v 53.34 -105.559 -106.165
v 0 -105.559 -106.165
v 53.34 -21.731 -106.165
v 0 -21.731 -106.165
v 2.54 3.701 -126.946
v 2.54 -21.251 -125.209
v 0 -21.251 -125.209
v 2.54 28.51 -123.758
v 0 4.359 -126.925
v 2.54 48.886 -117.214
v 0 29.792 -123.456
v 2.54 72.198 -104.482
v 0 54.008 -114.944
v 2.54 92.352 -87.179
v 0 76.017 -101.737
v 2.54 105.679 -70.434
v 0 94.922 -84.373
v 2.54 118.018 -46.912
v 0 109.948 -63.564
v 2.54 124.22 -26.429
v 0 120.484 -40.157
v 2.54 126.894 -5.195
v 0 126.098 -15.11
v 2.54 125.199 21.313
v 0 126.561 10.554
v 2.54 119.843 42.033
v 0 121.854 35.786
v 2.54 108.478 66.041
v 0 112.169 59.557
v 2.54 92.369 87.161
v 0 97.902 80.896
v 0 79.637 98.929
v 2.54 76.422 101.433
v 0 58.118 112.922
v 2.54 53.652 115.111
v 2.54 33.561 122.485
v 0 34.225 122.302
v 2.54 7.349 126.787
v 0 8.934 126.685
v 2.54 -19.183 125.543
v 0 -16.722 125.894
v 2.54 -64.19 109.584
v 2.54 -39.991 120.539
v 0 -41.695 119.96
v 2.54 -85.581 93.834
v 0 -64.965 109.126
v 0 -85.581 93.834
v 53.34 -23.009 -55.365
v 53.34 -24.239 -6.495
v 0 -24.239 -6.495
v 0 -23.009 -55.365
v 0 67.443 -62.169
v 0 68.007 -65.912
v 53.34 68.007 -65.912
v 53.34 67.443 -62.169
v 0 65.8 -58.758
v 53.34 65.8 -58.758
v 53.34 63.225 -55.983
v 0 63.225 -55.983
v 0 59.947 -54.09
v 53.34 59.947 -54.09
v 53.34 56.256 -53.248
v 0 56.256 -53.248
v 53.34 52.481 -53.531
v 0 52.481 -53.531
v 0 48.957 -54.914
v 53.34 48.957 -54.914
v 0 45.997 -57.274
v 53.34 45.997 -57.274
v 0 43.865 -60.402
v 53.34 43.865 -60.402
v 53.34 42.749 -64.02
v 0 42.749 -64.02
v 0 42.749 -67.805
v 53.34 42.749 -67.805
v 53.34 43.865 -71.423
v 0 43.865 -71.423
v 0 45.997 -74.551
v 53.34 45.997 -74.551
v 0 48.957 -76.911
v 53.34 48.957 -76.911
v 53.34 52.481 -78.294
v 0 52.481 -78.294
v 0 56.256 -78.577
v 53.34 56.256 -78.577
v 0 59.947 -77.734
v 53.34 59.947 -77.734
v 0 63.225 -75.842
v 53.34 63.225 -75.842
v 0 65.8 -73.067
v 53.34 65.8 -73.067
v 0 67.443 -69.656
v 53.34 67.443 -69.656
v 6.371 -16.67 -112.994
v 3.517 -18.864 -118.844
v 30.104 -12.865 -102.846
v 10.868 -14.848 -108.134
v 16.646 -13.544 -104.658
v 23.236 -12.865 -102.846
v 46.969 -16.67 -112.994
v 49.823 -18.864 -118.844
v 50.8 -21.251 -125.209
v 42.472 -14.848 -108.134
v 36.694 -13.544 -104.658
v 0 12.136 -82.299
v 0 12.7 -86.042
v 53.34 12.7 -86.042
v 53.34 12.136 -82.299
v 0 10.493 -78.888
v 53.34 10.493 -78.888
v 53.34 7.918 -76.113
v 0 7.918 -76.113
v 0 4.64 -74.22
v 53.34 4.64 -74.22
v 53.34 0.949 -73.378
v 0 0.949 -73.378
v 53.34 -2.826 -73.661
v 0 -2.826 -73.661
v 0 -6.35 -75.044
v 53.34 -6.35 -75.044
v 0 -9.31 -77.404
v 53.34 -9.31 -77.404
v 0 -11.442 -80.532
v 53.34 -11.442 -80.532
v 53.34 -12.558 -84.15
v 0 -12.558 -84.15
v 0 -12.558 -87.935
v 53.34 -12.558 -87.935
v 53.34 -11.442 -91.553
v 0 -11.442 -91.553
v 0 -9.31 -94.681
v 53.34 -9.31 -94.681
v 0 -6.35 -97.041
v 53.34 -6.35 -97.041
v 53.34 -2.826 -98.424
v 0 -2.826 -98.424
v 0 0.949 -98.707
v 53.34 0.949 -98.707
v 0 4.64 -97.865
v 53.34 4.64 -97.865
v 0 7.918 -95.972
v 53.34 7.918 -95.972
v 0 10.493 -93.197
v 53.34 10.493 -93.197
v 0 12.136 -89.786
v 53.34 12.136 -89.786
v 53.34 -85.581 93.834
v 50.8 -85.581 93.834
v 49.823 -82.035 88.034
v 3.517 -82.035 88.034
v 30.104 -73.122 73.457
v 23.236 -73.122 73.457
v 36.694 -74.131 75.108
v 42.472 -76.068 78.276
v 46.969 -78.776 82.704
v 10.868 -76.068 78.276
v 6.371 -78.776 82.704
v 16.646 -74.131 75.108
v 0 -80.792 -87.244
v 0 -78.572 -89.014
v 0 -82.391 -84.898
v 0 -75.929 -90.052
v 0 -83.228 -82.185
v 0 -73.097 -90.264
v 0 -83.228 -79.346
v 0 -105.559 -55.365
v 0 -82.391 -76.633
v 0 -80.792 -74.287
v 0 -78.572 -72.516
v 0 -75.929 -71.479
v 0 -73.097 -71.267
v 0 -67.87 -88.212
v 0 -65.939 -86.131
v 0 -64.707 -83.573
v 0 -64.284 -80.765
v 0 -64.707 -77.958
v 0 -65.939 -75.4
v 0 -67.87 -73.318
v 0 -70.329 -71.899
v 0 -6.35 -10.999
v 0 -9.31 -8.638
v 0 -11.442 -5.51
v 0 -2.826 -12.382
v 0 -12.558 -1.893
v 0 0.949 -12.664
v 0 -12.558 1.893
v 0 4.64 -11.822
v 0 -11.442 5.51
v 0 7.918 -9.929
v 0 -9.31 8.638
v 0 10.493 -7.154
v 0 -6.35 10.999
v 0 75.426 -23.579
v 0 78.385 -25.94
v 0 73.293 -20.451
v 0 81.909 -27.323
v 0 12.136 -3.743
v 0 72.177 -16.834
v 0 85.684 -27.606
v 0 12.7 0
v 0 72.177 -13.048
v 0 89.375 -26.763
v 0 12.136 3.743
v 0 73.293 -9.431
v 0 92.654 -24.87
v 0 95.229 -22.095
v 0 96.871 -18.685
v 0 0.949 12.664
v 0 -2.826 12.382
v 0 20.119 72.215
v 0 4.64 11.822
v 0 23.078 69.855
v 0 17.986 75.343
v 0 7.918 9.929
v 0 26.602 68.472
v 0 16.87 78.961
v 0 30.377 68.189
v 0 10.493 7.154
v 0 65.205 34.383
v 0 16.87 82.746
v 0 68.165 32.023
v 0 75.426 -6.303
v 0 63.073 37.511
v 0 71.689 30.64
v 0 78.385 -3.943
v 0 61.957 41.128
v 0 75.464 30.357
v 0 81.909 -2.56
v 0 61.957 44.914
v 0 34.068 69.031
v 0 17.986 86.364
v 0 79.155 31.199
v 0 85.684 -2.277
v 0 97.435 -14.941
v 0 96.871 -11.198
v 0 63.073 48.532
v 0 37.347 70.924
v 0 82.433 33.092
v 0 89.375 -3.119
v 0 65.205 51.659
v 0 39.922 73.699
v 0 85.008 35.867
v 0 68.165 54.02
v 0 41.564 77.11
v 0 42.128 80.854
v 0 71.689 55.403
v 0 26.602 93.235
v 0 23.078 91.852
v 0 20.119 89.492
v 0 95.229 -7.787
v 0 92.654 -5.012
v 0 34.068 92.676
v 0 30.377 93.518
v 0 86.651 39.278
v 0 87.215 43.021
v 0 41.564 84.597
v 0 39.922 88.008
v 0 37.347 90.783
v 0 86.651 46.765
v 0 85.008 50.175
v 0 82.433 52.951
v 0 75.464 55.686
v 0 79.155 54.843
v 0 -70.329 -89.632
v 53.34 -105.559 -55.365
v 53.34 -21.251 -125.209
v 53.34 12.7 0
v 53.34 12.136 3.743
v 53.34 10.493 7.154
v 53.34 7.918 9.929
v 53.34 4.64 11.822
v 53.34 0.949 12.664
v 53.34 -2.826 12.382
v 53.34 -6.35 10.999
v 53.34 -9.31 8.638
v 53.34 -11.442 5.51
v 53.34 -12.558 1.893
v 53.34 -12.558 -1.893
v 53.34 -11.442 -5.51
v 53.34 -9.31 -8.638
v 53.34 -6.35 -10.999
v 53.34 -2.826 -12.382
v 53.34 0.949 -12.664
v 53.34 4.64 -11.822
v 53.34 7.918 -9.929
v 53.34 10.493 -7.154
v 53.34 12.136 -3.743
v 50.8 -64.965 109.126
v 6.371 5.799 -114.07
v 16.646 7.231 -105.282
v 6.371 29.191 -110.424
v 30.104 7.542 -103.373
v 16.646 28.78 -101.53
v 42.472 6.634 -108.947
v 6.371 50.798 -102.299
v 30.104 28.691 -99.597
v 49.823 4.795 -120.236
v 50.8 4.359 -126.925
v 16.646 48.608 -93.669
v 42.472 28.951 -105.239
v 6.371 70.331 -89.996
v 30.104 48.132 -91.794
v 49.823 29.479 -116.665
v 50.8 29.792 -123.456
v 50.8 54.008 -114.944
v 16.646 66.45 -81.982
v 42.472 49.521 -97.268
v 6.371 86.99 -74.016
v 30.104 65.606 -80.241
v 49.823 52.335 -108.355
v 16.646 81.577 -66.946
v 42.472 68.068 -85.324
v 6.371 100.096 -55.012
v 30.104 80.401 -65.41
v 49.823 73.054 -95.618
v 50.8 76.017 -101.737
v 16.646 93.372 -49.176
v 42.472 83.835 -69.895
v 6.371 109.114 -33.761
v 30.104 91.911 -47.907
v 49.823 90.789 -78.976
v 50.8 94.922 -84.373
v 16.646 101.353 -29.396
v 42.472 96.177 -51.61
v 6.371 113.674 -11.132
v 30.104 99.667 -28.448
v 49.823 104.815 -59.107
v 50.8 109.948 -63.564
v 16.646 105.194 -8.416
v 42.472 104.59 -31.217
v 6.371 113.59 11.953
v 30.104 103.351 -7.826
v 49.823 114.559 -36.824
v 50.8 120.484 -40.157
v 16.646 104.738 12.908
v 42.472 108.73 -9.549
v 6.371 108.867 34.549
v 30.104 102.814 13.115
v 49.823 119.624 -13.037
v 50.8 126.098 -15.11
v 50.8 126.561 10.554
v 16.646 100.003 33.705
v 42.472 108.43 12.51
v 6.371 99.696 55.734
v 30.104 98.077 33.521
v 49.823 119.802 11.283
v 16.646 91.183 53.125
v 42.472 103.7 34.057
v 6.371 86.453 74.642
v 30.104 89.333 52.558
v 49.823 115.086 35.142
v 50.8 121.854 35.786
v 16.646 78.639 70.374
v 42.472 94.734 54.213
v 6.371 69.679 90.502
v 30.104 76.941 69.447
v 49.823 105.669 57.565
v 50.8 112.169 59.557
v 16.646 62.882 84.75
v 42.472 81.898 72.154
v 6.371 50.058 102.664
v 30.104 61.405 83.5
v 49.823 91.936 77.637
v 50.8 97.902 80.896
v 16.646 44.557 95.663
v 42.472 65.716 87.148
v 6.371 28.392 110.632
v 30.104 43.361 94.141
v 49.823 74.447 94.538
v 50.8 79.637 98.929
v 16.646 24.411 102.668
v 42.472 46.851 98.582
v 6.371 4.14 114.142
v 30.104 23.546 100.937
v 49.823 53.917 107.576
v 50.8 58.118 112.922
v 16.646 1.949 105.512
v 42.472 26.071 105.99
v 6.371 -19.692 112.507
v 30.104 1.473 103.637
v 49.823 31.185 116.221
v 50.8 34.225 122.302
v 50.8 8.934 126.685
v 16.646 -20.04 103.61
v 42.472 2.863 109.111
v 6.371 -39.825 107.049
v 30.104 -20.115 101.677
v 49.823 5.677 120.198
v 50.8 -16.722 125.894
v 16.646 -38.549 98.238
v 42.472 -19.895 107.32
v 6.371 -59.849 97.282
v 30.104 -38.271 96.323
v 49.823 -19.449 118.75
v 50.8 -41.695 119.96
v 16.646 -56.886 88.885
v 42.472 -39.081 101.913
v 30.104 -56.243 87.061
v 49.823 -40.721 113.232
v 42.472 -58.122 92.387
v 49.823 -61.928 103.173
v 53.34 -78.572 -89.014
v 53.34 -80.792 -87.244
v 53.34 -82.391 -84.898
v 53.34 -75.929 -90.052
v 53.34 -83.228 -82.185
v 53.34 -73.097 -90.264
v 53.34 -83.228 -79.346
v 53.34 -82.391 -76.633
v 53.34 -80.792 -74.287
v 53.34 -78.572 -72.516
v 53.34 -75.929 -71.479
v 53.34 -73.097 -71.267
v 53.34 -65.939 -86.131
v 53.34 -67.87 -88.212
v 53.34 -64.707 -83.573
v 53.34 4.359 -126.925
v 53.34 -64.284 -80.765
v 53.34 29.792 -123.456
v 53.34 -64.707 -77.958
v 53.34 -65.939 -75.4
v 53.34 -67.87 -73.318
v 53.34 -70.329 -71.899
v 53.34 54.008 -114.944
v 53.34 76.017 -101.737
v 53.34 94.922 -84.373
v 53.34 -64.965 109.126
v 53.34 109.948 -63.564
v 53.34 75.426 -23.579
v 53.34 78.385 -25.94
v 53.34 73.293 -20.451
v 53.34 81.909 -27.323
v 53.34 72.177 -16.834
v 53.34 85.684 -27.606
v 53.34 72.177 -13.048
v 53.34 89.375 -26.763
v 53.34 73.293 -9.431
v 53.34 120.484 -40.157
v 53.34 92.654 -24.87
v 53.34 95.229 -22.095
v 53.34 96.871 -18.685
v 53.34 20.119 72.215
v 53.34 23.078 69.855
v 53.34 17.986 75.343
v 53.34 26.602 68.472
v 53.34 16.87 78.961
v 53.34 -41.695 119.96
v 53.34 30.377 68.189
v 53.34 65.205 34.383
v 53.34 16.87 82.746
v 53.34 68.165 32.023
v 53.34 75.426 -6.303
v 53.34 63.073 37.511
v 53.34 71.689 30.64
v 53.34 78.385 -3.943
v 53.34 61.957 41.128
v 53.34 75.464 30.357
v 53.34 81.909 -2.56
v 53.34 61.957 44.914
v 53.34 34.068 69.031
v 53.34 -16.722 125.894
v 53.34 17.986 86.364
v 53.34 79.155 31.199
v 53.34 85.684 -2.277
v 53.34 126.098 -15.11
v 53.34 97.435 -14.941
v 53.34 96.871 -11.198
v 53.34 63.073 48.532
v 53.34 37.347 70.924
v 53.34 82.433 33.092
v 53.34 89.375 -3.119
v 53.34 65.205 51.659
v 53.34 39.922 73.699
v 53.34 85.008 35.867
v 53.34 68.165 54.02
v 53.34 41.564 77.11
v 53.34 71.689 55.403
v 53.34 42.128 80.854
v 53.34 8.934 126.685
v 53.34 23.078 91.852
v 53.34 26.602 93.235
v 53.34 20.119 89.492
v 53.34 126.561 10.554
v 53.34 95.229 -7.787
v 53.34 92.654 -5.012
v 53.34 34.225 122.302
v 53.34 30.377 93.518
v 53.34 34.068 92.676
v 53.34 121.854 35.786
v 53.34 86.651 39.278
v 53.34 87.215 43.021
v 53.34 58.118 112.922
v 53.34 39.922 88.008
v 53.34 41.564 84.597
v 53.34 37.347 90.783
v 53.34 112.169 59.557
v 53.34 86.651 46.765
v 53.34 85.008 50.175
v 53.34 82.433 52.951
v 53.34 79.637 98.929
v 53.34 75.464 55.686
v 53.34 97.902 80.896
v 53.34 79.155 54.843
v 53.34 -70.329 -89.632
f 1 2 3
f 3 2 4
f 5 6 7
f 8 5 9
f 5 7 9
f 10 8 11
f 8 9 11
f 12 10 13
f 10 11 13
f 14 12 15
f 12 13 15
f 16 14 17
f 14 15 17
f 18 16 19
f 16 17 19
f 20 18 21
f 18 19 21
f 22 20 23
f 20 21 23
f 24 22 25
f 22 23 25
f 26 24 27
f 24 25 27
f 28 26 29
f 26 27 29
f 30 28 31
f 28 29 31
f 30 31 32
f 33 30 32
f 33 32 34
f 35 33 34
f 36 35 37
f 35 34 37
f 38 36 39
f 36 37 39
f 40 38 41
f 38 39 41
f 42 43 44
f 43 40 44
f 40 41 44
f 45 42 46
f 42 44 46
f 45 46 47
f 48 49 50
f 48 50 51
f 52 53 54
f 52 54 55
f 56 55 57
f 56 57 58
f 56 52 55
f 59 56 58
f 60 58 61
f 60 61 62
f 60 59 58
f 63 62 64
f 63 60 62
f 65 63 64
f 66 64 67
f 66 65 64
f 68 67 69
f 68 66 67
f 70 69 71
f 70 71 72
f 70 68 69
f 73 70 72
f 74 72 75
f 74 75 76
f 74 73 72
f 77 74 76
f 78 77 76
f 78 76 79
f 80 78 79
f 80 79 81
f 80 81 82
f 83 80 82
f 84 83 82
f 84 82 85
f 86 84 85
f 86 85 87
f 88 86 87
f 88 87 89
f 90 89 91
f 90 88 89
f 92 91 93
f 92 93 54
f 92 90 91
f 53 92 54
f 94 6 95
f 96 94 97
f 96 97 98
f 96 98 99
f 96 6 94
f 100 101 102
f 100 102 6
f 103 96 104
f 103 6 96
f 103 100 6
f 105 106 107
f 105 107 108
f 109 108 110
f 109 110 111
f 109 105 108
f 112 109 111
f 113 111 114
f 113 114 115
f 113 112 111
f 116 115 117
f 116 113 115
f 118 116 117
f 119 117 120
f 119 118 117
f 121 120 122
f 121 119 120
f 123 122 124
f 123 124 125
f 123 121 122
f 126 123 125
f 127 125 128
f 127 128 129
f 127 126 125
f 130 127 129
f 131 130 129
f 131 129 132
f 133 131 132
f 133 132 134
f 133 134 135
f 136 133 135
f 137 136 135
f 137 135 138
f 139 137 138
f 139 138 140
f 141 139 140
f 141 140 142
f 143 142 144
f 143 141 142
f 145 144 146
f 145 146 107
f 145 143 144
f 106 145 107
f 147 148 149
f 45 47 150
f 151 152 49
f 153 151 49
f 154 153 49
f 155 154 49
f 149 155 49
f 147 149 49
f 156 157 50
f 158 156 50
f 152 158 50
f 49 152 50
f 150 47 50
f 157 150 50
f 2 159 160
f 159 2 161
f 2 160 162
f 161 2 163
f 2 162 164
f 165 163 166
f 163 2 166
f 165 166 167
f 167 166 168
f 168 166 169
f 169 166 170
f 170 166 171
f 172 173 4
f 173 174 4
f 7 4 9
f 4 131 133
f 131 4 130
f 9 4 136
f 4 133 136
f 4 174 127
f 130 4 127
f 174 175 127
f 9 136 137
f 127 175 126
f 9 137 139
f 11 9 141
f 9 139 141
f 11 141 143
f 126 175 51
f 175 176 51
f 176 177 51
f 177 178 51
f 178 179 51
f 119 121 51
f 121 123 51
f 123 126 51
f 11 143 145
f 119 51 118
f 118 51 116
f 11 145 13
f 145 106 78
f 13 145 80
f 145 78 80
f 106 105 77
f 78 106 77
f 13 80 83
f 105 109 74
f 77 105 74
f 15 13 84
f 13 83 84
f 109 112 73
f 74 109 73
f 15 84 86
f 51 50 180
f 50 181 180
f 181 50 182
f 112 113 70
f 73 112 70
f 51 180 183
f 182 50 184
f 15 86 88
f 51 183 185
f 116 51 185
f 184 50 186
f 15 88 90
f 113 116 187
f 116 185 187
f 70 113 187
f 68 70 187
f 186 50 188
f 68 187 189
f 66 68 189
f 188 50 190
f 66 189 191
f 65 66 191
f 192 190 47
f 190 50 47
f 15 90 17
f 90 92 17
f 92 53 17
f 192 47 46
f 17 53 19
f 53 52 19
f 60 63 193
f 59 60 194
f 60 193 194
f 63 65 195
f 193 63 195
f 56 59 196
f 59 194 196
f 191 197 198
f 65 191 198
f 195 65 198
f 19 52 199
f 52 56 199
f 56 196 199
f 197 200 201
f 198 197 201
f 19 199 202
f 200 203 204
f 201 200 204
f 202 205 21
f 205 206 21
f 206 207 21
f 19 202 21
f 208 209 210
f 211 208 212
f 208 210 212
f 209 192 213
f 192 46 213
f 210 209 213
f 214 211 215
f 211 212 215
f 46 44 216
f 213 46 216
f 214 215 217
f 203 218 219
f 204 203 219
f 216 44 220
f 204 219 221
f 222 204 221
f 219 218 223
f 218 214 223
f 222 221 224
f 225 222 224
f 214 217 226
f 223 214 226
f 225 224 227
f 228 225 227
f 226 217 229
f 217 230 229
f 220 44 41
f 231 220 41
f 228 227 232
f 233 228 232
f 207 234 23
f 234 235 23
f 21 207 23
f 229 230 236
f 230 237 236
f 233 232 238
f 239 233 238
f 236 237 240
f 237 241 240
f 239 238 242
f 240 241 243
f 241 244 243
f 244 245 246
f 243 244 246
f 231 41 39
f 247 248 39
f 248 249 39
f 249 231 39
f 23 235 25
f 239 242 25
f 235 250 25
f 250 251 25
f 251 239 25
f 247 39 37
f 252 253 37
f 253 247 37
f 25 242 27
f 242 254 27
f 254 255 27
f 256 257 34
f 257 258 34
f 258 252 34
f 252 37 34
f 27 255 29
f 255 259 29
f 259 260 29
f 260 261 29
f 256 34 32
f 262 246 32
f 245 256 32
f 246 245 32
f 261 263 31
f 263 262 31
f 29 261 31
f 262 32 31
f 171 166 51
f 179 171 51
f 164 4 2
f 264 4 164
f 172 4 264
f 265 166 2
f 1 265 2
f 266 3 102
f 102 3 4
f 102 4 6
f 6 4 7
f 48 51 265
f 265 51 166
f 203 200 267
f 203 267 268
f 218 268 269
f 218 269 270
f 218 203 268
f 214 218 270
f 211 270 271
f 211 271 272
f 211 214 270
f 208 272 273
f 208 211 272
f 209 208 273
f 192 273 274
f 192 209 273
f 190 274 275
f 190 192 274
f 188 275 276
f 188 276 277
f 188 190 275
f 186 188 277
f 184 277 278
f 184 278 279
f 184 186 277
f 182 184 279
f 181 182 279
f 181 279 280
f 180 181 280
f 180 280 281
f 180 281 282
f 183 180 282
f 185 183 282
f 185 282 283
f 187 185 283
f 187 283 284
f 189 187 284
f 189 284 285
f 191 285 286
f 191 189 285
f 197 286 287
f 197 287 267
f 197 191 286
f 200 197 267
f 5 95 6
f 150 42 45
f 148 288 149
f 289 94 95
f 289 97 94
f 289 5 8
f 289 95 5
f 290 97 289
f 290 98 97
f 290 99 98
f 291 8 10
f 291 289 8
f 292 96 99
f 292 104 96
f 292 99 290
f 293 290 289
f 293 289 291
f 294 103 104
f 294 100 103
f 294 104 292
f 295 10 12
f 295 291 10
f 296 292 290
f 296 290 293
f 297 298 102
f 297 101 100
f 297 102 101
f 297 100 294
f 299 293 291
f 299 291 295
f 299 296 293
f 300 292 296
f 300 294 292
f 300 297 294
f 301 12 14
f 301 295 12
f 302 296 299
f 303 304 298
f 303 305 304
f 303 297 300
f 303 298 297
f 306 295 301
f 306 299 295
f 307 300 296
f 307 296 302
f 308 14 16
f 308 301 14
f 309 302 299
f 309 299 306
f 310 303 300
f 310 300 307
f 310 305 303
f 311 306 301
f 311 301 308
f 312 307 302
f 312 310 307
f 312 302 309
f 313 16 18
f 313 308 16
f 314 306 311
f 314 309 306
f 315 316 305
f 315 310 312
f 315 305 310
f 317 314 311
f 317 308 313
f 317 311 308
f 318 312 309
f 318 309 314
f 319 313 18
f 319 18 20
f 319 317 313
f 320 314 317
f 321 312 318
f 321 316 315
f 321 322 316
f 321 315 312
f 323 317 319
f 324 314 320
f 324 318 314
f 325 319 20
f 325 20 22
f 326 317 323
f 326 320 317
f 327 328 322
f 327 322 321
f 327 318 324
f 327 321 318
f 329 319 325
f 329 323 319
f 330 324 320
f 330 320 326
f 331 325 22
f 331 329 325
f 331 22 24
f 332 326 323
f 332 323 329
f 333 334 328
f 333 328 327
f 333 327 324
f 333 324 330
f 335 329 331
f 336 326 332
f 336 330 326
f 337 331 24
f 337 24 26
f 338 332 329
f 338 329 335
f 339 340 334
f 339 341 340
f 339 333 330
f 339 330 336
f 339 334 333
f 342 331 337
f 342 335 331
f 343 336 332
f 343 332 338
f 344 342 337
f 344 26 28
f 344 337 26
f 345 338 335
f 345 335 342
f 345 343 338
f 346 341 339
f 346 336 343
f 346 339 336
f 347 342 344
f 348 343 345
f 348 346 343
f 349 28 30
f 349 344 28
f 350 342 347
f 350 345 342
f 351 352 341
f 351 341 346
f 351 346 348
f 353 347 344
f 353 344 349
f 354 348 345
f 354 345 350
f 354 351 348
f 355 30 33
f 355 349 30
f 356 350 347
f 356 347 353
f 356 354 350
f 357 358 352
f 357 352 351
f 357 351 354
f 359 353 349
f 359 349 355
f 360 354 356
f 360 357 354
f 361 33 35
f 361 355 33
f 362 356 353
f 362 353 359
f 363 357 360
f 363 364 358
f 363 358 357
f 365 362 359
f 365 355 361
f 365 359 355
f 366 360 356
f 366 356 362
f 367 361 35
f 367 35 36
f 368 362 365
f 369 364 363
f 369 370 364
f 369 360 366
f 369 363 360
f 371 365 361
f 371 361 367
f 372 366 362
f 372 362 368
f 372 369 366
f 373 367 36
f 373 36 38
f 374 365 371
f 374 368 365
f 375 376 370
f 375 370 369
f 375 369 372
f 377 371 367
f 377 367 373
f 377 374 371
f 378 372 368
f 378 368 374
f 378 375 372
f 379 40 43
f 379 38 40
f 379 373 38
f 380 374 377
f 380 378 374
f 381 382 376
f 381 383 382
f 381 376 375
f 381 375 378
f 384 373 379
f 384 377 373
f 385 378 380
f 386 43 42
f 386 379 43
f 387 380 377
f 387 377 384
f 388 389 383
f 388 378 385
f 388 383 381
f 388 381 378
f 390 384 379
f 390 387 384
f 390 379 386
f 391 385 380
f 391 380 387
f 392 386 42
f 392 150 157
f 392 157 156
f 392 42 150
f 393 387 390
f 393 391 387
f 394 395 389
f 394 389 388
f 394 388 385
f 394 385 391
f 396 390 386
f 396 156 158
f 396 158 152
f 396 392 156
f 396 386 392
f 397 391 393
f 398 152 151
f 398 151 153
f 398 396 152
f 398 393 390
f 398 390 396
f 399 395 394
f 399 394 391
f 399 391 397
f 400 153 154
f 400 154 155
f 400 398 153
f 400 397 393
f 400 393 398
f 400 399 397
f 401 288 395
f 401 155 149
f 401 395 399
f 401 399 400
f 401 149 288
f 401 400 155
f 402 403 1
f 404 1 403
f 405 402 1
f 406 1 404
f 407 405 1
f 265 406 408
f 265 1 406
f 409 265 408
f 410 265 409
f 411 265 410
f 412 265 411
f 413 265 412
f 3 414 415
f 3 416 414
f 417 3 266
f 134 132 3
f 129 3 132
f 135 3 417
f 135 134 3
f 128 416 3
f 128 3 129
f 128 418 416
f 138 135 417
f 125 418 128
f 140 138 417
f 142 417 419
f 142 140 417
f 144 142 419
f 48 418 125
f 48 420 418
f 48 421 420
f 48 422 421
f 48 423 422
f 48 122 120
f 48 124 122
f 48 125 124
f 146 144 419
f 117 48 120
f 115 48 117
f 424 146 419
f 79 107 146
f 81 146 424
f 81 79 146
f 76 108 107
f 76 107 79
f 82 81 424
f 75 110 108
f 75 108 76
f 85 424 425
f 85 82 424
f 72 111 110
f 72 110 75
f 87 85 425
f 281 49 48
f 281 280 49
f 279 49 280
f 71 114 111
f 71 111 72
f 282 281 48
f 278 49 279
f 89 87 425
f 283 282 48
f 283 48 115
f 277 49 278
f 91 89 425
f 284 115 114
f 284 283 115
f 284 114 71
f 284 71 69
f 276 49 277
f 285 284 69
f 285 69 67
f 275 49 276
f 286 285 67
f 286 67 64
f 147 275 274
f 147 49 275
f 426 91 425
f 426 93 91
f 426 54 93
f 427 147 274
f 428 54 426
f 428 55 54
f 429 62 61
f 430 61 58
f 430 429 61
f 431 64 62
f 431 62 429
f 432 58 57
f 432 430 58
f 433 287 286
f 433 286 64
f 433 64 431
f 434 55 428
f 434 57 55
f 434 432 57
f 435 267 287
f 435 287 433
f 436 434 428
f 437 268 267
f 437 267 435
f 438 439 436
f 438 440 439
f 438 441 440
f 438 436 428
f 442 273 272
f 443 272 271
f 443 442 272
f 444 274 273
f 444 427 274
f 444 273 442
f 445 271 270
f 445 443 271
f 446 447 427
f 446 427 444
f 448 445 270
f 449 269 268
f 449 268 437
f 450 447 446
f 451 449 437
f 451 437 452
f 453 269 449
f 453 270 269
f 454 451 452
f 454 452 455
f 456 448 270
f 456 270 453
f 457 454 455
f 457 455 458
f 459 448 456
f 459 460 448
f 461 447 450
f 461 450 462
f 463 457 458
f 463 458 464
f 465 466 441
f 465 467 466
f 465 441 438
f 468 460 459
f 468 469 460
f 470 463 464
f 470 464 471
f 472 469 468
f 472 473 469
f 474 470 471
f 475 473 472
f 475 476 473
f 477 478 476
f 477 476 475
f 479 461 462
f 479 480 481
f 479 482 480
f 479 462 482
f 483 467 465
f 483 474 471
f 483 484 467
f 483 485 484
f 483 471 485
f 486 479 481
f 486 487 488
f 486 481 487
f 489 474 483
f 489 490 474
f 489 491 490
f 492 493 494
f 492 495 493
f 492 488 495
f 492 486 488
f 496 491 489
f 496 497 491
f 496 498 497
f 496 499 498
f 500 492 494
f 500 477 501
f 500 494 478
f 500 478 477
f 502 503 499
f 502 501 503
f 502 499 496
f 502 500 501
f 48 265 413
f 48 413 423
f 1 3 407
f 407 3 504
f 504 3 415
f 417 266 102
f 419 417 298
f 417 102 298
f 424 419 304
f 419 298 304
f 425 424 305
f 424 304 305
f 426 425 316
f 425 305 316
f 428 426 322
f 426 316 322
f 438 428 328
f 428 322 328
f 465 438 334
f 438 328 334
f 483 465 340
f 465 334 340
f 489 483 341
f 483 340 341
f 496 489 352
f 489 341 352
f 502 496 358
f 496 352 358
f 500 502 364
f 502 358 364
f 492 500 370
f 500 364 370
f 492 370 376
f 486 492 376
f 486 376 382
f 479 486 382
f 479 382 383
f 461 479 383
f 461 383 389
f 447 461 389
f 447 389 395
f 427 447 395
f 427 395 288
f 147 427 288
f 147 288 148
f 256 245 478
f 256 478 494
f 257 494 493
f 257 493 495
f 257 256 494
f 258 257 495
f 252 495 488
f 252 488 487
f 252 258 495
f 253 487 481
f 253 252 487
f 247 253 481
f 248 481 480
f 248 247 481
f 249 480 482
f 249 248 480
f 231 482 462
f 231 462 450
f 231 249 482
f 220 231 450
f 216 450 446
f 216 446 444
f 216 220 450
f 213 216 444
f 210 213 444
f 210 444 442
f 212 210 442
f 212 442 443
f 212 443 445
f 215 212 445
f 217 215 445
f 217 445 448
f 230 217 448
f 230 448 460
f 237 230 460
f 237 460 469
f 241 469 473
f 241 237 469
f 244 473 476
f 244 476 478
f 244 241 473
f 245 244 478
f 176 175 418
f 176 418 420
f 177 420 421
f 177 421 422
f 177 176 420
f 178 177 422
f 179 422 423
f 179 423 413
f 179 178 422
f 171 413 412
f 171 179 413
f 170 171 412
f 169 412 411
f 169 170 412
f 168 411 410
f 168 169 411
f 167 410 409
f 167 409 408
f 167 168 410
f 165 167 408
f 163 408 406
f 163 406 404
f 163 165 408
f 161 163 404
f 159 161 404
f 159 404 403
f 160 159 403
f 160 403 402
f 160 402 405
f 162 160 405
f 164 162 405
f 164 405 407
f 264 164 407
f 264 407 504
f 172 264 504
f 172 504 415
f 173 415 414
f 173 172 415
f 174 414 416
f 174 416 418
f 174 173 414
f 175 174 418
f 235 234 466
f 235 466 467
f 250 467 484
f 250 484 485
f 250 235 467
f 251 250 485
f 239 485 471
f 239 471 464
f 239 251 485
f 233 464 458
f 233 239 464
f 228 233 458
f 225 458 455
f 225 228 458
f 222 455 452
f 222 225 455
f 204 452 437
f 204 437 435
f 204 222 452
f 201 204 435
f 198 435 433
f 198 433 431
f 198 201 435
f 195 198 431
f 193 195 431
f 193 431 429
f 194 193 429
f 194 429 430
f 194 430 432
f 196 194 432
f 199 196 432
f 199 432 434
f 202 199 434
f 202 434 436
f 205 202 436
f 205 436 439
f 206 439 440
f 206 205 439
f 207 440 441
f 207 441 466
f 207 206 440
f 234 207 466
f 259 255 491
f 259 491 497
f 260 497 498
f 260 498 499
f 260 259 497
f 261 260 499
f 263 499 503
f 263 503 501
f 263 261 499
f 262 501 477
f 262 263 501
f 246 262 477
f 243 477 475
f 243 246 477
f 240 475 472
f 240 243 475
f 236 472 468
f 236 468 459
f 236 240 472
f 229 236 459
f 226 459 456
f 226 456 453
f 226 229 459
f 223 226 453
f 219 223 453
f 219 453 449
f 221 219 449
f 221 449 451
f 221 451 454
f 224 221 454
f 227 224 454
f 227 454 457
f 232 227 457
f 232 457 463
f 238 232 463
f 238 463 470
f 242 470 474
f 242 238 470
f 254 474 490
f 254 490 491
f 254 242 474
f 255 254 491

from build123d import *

# Parameters (mm, degrees)
F0_R     = 9.525
F0_R_2   = 12.7
F1_DEPTH = 53.34


with BuildPart() as f1:
    # F0 (on Right) → F1 (new body)
    with BuildSketch(Plane.YZ):
        with BuildLine():
            Line((-21.7306433309, -106.1653788452), (-21.2513333333, -125.2093480198))
            ThreePointArc((-21.2513333333, -125.2093480198), (121.8537281077, 35.7864352271), (-85.5809014362, 93.8344782549))
            Line((-85.5809014362, 93.8344782549), (-24.2392100937, -6.4948767698))
            Line((-24.2392100937, -6.4948767698), (-23.0092080907, -55.3653788452))
            Line((-23.0092080907, -55.3653788452), (-105.5592080907, -55.3653788452))
            Line((-105.5592080907, -55.3653788452), (-105.5592080907, -106.1653788452))
            Line((-105.5592080907, -106.1653788452), (-21.7306433309, -106.1653788452))
        make_face()
        with Locations((-73.8092080907, -80.7653788452)):
            Circle(F0_R, mode=Mode.SUBTRACT)
        with Locations((0, -86.0425)):
            Circle(F0_R_2, mode=Mode.SUBTRACT)
        with Locations((55.3070529065, -65.9123789971)):
            Circle(F0_R_2, mode=Mode.SUBTRACT)
        with Locations((84.7353210886, -14.9411233269)):
            Circle(F0_R_2, mode=Mode.SUBTRACT)
        Circle(F0_R_2, mode=Mode.SUBTRACT)
        with Locations((74.5149908051, 43.02125)):
            Circle(F0_R_2, mode=Mode.SUBTRACT)
        with Locations((29.4282681821, 80.853502324)):
            Circle(F0_R_2, mode=Mode.SUBTRACT)
    extrude(amount=F1_DEPTH)

    # F3: sweep along a path in F3_path
    with BuildLine(Plane(origin=(53.34, -21.2513333333, -125.2093480198), x_dir=(0, 0, 1), z_dir=(1, 0, 0))) as f3_path:
        ThreePointArc((0, 0), (160.995783247, -143.105061441), (219.0438262748, 64.3295681028))
    # F2 (on face) → F3 (sweep, cut)
    with BuildSketch(Plane(origin=(0, -20.5342212669, -12.5546891296), x_dir=(1, 0, 0), z_dir=(0, -0.8531709236, -0.5216314552))):
        with BuildLine():
            ThreePointArc((2.54, 124.6985386355), (26.67, 100.5685386355), (50.8, 124.6985386355))
            Line((50.8, 124.6985386355), (2.54, 124.6985386355))
        make_face()
        with BuildLine():
            Line((2.54, 124.6985386355), (50.8, 124.6985386355))
            ThreePointArc((50.8, 124.6985386355), (26.67, 148.8285386355), (2.54, 124.6985386355))
        make_face()
    sweep(path=f3_path.line, mode=Mode.SUBTRACT)


solid = f1.part
